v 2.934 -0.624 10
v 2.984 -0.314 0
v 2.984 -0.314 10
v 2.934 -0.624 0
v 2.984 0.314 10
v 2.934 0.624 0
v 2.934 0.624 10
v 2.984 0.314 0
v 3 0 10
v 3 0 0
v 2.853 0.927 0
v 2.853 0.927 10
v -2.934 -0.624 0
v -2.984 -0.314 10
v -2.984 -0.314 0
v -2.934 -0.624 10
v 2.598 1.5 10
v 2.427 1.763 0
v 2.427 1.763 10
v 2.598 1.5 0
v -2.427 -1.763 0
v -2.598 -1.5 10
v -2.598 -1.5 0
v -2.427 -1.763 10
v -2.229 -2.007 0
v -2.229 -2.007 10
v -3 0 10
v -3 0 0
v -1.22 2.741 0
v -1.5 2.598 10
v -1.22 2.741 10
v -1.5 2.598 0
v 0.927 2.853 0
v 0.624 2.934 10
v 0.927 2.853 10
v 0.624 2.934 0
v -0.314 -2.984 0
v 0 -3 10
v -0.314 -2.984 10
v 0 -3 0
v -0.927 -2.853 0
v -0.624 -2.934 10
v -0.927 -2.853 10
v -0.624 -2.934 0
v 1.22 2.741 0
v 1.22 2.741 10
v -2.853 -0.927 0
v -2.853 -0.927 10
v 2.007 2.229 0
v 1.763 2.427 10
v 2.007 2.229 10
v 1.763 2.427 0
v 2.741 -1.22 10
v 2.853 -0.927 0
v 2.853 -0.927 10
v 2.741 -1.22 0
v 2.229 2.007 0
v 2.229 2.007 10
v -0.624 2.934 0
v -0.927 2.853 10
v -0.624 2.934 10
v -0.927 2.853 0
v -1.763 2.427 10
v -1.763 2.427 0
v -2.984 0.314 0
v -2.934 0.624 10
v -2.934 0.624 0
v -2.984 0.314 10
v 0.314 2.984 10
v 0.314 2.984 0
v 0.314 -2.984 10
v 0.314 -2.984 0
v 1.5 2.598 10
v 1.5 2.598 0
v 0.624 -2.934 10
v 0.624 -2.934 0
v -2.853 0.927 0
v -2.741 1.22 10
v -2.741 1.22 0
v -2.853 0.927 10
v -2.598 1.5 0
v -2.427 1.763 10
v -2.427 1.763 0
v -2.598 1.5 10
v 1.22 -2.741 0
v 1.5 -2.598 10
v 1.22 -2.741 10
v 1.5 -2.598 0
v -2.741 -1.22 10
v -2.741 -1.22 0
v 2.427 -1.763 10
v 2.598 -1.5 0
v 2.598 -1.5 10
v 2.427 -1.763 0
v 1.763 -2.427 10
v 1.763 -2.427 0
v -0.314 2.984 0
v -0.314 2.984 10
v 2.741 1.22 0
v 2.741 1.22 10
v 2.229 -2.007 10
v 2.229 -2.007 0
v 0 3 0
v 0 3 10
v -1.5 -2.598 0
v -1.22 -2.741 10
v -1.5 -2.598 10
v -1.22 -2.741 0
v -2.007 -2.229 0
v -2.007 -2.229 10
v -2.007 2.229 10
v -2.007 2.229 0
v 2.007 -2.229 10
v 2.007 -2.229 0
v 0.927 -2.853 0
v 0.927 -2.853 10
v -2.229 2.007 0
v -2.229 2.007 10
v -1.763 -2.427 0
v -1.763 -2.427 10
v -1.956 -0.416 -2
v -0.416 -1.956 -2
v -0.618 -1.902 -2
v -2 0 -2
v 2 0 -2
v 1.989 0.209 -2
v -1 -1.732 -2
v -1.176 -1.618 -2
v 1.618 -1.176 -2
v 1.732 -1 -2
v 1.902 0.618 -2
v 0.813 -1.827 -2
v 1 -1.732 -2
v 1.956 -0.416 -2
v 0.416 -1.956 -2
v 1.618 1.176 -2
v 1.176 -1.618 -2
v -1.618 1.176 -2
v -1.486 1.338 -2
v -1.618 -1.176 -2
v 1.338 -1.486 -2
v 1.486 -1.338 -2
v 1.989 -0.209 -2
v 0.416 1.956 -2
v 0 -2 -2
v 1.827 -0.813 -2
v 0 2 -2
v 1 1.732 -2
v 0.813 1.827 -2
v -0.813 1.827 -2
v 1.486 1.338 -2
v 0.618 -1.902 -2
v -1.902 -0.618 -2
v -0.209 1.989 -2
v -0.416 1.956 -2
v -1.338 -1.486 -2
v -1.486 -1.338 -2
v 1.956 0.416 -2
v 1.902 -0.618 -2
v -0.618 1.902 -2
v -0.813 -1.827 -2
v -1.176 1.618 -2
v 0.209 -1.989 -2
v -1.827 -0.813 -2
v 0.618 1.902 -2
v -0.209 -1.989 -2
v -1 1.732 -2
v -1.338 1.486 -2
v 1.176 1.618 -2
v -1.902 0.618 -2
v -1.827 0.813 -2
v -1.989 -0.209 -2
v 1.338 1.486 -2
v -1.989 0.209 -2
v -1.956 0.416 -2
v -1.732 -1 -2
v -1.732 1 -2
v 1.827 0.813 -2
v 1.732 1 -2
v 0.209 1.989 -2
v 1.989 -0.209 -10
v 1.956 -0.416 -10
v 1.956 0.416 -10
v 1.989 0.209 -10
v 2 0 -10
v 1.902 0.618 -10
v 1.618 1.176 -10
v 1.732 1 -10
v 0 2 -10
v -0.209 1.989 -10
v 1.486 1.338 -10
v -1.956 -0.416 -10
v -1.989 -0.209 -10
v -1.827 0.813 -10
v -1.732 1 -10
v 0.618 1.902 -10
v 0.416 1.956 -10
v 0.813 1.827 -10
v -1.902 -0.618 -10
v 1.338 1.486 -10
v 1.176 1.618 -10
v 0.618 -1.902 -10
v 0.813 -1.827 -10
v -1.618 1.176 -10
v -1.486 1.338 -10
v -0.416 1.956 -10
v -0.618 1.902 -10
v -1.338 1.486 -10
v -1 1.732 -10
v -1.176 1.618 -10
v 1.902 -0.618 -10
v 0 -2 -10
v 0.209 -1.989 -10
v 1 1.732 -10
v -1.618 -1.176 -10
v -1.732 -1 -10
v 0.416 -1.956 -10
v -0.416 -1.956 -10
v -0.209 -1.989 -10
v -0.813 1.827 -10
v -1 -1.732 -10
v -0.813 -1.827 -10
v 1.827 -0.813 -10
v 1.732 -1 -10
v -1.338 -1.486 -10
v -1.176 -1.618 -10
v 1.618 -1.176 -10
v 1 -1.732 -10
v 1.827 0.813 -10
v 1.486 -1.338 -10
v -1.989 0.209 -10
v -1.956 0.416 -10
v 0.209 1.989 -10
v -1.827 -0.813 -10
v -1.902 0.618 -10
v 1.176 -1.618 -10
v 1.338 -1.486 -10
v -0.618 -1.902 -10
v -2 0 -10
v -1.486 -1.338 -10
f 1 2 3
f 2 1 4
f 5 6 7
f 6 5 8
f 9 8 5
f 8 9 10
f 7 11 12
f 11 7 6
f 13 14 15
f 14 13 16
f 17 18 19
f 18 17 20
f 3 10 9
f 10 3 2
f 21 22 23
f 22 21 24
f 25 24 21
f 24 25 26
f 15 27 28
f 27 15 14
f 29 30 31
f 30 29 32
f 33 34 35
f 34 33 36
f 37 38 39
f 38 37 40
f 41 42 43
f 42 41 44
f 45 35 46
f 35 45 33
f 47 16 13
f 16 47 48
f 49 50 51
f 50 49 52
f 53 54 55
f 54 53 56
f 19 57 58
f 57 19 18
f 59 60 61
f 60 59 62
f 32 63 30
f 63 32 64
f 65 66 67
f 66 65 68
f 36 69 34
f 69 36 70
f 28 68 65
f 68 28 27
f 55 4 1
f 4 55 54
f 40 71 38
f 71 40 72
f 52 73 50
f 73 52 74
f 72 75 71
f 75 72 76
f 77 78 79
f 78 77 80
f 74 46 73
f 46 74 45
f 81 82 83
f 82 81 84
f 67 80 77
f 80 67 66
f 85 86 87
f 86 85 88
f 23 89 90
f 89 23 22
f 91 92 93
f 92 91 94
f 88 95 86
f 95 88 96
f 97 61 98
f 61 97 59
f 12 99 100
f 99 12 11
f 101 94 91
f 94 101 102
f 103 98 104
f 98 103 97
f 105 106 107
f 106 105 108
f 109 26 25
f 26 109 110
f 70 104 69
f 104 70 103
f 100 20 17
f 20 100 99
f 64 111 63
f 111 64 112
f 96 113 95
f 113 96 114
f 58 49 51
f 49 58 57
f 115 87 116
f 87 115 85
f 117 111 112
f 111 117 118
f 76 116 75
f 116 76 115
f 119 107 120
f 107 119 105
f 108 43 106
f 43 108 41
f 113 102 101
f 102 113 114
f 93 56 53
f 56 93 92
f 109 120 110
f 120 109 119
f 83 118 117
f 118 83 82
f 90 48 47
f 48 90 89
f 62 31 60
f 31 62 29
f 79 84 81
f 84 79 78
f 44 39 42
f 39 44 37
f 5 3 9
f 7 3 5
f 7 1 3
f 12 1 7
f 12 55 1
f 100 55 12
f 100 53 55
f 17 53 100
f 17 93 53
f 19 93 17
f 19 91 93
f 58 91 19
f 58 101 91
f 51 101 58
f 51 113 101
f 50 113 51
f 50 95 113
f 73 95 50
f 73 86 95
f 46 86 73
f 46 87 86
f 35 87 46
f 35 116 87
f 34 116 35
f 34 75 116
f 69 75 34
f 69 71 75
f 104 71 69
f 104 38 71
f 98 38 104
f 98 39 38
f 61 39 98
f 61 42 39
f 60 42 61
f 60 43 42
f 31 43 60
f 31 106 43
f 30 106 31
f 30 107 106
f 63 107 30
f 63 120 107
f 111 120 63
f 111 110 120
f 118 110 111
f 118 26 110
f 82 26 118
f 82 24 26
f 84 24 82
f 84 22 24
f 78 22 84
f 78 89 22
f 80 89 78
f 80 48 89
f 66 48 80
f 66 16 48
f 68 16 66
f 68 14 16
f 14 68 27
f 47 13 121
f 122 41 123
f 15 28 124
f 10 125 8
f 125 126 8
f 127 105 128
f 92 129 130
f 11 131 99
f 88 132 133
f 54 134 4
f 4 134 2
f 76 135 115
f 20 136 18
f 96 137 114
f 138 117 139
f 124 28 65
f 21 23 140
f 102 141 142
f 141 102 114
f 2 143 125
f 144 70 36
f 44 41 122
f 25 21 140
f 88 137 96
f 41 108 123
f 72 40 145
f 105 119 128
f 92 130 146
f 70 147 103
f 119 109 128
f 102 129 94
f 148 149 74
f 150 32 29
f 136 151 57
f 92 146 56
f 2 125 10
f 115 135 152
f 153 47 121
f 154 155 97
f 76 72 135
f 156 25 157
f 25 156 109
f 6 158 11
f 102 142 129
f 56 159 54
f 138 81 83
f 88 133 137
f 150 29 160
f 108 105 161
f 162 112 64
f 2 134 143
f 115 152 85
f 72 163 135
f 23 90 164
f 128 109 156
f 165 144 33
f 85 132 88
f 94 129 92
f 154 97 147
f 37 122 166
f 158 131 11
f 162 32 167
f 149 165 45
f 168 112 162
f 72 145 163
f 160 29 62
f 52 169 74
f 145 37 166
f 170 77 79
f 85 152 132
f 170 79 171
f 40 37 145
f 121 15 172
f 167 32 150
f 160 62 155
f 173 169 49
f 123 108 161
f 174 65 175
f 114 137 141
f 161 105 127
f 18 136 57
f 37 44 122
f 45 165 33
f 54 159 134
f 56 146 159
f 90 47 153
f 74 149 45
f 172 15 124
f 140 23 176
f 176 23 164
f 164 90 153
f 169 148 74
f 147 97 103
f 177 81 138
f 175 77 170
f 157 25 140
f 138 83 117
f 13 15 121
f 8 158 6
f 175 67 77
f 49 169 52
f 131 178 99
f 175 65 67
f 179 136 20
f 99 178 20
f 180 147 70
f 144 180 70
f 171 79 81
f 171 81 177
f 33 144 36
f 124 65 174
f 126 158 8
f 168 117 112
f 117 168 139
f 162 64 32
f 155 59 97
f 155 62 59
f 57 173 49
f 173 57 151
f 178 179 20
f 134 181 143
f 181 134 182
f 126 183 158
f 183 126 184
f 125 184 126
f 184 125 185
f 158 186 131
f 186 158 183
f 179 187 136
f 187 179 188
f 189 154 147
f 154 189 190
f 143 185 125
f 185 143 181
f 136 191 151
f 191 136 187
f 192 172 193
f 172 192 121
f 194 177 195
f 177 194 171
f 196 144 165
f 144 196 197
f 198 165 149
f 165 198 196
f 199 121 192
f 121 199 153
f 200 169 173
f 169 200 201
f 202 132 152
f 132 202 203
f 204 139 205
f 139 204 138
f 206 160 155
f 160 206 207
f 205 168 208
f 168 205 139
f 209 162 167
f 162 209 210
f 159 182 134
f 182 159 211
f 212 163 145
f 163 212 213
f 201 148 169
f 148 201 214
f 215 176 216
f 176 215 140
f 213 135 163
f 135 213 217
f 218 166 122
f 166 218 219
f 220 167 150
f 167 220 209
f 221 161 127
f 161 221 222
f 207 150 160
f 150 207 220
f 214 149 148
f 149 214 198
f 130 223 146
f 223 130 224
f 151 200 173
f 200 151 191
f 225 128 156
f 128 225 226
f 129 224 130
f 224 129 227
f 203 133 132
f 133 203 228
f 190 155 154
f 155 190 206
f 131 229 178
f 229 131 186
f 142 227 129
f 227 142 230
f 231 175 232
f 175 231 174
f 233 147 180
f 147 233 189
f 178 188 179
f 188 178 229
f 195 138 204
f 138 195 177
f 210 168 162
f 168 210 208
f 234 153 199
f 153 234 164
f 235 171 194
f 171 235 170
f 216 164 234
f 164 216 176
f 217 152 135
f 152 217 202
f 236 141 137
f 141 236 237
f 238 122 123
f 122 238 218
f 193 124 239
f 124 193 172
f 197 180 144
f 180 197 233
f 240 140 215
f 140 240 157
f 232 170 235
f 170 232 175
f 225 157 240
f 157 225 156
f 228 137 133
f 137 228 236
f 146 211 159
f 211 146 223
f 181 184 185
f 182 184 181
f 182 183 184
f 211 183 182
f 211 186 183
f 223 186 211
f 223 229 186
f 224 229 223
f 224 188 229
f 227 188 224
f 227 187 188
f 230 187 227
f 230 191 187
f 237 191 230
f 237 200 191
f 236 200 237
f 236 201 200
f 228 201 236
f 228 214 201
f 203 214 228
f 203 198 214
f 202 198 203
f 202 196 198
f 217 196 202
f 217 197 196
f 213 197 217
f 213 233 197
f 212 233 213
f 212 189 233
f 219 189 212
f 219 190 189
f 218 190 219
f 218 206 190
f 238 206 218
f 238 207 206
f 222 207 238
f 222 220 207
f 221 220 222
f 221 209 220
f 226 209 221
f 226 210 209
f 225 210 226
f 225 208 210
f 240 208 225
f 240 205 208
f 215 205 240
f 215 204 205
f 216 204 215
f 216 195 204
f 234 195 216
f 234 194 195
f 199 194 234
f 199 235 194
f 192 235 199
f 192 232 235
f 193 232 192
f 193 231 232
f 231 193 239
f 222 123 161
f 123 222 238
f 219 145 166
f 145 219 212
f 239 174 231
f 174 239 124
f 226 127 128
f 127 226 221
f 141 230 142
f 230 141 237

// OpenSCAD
CountersunkScrewHole();

module CountersunkScrewHole(
	screwRadius		= 2,
	headRadius		= 3,
	headDepth		= 2,
	holeDepth		= 10,
	countersinkDepth	= 10
)
{
	translate([0, 0, -holeDepth/2])
	union(){
		// countersink
		translate([0, 0, holeDepth/2 + countersinkDepth/2]) 
			cylinder(h=countersinkDepth, r=headRadius, center=true, $fn=60);
		// beveled head
		translate([0, 0, holeDepth/2 - headDepth/2])
			cylinder(h=headDepth, r1=screwRadius, r2=headRadius, center=true, $fn=60);
		// screw shaft
		cylinder(h=holeDepth, r=screwRadius, center=true, $fn=60);
	} // union
} // CountersunkScrewHole module
